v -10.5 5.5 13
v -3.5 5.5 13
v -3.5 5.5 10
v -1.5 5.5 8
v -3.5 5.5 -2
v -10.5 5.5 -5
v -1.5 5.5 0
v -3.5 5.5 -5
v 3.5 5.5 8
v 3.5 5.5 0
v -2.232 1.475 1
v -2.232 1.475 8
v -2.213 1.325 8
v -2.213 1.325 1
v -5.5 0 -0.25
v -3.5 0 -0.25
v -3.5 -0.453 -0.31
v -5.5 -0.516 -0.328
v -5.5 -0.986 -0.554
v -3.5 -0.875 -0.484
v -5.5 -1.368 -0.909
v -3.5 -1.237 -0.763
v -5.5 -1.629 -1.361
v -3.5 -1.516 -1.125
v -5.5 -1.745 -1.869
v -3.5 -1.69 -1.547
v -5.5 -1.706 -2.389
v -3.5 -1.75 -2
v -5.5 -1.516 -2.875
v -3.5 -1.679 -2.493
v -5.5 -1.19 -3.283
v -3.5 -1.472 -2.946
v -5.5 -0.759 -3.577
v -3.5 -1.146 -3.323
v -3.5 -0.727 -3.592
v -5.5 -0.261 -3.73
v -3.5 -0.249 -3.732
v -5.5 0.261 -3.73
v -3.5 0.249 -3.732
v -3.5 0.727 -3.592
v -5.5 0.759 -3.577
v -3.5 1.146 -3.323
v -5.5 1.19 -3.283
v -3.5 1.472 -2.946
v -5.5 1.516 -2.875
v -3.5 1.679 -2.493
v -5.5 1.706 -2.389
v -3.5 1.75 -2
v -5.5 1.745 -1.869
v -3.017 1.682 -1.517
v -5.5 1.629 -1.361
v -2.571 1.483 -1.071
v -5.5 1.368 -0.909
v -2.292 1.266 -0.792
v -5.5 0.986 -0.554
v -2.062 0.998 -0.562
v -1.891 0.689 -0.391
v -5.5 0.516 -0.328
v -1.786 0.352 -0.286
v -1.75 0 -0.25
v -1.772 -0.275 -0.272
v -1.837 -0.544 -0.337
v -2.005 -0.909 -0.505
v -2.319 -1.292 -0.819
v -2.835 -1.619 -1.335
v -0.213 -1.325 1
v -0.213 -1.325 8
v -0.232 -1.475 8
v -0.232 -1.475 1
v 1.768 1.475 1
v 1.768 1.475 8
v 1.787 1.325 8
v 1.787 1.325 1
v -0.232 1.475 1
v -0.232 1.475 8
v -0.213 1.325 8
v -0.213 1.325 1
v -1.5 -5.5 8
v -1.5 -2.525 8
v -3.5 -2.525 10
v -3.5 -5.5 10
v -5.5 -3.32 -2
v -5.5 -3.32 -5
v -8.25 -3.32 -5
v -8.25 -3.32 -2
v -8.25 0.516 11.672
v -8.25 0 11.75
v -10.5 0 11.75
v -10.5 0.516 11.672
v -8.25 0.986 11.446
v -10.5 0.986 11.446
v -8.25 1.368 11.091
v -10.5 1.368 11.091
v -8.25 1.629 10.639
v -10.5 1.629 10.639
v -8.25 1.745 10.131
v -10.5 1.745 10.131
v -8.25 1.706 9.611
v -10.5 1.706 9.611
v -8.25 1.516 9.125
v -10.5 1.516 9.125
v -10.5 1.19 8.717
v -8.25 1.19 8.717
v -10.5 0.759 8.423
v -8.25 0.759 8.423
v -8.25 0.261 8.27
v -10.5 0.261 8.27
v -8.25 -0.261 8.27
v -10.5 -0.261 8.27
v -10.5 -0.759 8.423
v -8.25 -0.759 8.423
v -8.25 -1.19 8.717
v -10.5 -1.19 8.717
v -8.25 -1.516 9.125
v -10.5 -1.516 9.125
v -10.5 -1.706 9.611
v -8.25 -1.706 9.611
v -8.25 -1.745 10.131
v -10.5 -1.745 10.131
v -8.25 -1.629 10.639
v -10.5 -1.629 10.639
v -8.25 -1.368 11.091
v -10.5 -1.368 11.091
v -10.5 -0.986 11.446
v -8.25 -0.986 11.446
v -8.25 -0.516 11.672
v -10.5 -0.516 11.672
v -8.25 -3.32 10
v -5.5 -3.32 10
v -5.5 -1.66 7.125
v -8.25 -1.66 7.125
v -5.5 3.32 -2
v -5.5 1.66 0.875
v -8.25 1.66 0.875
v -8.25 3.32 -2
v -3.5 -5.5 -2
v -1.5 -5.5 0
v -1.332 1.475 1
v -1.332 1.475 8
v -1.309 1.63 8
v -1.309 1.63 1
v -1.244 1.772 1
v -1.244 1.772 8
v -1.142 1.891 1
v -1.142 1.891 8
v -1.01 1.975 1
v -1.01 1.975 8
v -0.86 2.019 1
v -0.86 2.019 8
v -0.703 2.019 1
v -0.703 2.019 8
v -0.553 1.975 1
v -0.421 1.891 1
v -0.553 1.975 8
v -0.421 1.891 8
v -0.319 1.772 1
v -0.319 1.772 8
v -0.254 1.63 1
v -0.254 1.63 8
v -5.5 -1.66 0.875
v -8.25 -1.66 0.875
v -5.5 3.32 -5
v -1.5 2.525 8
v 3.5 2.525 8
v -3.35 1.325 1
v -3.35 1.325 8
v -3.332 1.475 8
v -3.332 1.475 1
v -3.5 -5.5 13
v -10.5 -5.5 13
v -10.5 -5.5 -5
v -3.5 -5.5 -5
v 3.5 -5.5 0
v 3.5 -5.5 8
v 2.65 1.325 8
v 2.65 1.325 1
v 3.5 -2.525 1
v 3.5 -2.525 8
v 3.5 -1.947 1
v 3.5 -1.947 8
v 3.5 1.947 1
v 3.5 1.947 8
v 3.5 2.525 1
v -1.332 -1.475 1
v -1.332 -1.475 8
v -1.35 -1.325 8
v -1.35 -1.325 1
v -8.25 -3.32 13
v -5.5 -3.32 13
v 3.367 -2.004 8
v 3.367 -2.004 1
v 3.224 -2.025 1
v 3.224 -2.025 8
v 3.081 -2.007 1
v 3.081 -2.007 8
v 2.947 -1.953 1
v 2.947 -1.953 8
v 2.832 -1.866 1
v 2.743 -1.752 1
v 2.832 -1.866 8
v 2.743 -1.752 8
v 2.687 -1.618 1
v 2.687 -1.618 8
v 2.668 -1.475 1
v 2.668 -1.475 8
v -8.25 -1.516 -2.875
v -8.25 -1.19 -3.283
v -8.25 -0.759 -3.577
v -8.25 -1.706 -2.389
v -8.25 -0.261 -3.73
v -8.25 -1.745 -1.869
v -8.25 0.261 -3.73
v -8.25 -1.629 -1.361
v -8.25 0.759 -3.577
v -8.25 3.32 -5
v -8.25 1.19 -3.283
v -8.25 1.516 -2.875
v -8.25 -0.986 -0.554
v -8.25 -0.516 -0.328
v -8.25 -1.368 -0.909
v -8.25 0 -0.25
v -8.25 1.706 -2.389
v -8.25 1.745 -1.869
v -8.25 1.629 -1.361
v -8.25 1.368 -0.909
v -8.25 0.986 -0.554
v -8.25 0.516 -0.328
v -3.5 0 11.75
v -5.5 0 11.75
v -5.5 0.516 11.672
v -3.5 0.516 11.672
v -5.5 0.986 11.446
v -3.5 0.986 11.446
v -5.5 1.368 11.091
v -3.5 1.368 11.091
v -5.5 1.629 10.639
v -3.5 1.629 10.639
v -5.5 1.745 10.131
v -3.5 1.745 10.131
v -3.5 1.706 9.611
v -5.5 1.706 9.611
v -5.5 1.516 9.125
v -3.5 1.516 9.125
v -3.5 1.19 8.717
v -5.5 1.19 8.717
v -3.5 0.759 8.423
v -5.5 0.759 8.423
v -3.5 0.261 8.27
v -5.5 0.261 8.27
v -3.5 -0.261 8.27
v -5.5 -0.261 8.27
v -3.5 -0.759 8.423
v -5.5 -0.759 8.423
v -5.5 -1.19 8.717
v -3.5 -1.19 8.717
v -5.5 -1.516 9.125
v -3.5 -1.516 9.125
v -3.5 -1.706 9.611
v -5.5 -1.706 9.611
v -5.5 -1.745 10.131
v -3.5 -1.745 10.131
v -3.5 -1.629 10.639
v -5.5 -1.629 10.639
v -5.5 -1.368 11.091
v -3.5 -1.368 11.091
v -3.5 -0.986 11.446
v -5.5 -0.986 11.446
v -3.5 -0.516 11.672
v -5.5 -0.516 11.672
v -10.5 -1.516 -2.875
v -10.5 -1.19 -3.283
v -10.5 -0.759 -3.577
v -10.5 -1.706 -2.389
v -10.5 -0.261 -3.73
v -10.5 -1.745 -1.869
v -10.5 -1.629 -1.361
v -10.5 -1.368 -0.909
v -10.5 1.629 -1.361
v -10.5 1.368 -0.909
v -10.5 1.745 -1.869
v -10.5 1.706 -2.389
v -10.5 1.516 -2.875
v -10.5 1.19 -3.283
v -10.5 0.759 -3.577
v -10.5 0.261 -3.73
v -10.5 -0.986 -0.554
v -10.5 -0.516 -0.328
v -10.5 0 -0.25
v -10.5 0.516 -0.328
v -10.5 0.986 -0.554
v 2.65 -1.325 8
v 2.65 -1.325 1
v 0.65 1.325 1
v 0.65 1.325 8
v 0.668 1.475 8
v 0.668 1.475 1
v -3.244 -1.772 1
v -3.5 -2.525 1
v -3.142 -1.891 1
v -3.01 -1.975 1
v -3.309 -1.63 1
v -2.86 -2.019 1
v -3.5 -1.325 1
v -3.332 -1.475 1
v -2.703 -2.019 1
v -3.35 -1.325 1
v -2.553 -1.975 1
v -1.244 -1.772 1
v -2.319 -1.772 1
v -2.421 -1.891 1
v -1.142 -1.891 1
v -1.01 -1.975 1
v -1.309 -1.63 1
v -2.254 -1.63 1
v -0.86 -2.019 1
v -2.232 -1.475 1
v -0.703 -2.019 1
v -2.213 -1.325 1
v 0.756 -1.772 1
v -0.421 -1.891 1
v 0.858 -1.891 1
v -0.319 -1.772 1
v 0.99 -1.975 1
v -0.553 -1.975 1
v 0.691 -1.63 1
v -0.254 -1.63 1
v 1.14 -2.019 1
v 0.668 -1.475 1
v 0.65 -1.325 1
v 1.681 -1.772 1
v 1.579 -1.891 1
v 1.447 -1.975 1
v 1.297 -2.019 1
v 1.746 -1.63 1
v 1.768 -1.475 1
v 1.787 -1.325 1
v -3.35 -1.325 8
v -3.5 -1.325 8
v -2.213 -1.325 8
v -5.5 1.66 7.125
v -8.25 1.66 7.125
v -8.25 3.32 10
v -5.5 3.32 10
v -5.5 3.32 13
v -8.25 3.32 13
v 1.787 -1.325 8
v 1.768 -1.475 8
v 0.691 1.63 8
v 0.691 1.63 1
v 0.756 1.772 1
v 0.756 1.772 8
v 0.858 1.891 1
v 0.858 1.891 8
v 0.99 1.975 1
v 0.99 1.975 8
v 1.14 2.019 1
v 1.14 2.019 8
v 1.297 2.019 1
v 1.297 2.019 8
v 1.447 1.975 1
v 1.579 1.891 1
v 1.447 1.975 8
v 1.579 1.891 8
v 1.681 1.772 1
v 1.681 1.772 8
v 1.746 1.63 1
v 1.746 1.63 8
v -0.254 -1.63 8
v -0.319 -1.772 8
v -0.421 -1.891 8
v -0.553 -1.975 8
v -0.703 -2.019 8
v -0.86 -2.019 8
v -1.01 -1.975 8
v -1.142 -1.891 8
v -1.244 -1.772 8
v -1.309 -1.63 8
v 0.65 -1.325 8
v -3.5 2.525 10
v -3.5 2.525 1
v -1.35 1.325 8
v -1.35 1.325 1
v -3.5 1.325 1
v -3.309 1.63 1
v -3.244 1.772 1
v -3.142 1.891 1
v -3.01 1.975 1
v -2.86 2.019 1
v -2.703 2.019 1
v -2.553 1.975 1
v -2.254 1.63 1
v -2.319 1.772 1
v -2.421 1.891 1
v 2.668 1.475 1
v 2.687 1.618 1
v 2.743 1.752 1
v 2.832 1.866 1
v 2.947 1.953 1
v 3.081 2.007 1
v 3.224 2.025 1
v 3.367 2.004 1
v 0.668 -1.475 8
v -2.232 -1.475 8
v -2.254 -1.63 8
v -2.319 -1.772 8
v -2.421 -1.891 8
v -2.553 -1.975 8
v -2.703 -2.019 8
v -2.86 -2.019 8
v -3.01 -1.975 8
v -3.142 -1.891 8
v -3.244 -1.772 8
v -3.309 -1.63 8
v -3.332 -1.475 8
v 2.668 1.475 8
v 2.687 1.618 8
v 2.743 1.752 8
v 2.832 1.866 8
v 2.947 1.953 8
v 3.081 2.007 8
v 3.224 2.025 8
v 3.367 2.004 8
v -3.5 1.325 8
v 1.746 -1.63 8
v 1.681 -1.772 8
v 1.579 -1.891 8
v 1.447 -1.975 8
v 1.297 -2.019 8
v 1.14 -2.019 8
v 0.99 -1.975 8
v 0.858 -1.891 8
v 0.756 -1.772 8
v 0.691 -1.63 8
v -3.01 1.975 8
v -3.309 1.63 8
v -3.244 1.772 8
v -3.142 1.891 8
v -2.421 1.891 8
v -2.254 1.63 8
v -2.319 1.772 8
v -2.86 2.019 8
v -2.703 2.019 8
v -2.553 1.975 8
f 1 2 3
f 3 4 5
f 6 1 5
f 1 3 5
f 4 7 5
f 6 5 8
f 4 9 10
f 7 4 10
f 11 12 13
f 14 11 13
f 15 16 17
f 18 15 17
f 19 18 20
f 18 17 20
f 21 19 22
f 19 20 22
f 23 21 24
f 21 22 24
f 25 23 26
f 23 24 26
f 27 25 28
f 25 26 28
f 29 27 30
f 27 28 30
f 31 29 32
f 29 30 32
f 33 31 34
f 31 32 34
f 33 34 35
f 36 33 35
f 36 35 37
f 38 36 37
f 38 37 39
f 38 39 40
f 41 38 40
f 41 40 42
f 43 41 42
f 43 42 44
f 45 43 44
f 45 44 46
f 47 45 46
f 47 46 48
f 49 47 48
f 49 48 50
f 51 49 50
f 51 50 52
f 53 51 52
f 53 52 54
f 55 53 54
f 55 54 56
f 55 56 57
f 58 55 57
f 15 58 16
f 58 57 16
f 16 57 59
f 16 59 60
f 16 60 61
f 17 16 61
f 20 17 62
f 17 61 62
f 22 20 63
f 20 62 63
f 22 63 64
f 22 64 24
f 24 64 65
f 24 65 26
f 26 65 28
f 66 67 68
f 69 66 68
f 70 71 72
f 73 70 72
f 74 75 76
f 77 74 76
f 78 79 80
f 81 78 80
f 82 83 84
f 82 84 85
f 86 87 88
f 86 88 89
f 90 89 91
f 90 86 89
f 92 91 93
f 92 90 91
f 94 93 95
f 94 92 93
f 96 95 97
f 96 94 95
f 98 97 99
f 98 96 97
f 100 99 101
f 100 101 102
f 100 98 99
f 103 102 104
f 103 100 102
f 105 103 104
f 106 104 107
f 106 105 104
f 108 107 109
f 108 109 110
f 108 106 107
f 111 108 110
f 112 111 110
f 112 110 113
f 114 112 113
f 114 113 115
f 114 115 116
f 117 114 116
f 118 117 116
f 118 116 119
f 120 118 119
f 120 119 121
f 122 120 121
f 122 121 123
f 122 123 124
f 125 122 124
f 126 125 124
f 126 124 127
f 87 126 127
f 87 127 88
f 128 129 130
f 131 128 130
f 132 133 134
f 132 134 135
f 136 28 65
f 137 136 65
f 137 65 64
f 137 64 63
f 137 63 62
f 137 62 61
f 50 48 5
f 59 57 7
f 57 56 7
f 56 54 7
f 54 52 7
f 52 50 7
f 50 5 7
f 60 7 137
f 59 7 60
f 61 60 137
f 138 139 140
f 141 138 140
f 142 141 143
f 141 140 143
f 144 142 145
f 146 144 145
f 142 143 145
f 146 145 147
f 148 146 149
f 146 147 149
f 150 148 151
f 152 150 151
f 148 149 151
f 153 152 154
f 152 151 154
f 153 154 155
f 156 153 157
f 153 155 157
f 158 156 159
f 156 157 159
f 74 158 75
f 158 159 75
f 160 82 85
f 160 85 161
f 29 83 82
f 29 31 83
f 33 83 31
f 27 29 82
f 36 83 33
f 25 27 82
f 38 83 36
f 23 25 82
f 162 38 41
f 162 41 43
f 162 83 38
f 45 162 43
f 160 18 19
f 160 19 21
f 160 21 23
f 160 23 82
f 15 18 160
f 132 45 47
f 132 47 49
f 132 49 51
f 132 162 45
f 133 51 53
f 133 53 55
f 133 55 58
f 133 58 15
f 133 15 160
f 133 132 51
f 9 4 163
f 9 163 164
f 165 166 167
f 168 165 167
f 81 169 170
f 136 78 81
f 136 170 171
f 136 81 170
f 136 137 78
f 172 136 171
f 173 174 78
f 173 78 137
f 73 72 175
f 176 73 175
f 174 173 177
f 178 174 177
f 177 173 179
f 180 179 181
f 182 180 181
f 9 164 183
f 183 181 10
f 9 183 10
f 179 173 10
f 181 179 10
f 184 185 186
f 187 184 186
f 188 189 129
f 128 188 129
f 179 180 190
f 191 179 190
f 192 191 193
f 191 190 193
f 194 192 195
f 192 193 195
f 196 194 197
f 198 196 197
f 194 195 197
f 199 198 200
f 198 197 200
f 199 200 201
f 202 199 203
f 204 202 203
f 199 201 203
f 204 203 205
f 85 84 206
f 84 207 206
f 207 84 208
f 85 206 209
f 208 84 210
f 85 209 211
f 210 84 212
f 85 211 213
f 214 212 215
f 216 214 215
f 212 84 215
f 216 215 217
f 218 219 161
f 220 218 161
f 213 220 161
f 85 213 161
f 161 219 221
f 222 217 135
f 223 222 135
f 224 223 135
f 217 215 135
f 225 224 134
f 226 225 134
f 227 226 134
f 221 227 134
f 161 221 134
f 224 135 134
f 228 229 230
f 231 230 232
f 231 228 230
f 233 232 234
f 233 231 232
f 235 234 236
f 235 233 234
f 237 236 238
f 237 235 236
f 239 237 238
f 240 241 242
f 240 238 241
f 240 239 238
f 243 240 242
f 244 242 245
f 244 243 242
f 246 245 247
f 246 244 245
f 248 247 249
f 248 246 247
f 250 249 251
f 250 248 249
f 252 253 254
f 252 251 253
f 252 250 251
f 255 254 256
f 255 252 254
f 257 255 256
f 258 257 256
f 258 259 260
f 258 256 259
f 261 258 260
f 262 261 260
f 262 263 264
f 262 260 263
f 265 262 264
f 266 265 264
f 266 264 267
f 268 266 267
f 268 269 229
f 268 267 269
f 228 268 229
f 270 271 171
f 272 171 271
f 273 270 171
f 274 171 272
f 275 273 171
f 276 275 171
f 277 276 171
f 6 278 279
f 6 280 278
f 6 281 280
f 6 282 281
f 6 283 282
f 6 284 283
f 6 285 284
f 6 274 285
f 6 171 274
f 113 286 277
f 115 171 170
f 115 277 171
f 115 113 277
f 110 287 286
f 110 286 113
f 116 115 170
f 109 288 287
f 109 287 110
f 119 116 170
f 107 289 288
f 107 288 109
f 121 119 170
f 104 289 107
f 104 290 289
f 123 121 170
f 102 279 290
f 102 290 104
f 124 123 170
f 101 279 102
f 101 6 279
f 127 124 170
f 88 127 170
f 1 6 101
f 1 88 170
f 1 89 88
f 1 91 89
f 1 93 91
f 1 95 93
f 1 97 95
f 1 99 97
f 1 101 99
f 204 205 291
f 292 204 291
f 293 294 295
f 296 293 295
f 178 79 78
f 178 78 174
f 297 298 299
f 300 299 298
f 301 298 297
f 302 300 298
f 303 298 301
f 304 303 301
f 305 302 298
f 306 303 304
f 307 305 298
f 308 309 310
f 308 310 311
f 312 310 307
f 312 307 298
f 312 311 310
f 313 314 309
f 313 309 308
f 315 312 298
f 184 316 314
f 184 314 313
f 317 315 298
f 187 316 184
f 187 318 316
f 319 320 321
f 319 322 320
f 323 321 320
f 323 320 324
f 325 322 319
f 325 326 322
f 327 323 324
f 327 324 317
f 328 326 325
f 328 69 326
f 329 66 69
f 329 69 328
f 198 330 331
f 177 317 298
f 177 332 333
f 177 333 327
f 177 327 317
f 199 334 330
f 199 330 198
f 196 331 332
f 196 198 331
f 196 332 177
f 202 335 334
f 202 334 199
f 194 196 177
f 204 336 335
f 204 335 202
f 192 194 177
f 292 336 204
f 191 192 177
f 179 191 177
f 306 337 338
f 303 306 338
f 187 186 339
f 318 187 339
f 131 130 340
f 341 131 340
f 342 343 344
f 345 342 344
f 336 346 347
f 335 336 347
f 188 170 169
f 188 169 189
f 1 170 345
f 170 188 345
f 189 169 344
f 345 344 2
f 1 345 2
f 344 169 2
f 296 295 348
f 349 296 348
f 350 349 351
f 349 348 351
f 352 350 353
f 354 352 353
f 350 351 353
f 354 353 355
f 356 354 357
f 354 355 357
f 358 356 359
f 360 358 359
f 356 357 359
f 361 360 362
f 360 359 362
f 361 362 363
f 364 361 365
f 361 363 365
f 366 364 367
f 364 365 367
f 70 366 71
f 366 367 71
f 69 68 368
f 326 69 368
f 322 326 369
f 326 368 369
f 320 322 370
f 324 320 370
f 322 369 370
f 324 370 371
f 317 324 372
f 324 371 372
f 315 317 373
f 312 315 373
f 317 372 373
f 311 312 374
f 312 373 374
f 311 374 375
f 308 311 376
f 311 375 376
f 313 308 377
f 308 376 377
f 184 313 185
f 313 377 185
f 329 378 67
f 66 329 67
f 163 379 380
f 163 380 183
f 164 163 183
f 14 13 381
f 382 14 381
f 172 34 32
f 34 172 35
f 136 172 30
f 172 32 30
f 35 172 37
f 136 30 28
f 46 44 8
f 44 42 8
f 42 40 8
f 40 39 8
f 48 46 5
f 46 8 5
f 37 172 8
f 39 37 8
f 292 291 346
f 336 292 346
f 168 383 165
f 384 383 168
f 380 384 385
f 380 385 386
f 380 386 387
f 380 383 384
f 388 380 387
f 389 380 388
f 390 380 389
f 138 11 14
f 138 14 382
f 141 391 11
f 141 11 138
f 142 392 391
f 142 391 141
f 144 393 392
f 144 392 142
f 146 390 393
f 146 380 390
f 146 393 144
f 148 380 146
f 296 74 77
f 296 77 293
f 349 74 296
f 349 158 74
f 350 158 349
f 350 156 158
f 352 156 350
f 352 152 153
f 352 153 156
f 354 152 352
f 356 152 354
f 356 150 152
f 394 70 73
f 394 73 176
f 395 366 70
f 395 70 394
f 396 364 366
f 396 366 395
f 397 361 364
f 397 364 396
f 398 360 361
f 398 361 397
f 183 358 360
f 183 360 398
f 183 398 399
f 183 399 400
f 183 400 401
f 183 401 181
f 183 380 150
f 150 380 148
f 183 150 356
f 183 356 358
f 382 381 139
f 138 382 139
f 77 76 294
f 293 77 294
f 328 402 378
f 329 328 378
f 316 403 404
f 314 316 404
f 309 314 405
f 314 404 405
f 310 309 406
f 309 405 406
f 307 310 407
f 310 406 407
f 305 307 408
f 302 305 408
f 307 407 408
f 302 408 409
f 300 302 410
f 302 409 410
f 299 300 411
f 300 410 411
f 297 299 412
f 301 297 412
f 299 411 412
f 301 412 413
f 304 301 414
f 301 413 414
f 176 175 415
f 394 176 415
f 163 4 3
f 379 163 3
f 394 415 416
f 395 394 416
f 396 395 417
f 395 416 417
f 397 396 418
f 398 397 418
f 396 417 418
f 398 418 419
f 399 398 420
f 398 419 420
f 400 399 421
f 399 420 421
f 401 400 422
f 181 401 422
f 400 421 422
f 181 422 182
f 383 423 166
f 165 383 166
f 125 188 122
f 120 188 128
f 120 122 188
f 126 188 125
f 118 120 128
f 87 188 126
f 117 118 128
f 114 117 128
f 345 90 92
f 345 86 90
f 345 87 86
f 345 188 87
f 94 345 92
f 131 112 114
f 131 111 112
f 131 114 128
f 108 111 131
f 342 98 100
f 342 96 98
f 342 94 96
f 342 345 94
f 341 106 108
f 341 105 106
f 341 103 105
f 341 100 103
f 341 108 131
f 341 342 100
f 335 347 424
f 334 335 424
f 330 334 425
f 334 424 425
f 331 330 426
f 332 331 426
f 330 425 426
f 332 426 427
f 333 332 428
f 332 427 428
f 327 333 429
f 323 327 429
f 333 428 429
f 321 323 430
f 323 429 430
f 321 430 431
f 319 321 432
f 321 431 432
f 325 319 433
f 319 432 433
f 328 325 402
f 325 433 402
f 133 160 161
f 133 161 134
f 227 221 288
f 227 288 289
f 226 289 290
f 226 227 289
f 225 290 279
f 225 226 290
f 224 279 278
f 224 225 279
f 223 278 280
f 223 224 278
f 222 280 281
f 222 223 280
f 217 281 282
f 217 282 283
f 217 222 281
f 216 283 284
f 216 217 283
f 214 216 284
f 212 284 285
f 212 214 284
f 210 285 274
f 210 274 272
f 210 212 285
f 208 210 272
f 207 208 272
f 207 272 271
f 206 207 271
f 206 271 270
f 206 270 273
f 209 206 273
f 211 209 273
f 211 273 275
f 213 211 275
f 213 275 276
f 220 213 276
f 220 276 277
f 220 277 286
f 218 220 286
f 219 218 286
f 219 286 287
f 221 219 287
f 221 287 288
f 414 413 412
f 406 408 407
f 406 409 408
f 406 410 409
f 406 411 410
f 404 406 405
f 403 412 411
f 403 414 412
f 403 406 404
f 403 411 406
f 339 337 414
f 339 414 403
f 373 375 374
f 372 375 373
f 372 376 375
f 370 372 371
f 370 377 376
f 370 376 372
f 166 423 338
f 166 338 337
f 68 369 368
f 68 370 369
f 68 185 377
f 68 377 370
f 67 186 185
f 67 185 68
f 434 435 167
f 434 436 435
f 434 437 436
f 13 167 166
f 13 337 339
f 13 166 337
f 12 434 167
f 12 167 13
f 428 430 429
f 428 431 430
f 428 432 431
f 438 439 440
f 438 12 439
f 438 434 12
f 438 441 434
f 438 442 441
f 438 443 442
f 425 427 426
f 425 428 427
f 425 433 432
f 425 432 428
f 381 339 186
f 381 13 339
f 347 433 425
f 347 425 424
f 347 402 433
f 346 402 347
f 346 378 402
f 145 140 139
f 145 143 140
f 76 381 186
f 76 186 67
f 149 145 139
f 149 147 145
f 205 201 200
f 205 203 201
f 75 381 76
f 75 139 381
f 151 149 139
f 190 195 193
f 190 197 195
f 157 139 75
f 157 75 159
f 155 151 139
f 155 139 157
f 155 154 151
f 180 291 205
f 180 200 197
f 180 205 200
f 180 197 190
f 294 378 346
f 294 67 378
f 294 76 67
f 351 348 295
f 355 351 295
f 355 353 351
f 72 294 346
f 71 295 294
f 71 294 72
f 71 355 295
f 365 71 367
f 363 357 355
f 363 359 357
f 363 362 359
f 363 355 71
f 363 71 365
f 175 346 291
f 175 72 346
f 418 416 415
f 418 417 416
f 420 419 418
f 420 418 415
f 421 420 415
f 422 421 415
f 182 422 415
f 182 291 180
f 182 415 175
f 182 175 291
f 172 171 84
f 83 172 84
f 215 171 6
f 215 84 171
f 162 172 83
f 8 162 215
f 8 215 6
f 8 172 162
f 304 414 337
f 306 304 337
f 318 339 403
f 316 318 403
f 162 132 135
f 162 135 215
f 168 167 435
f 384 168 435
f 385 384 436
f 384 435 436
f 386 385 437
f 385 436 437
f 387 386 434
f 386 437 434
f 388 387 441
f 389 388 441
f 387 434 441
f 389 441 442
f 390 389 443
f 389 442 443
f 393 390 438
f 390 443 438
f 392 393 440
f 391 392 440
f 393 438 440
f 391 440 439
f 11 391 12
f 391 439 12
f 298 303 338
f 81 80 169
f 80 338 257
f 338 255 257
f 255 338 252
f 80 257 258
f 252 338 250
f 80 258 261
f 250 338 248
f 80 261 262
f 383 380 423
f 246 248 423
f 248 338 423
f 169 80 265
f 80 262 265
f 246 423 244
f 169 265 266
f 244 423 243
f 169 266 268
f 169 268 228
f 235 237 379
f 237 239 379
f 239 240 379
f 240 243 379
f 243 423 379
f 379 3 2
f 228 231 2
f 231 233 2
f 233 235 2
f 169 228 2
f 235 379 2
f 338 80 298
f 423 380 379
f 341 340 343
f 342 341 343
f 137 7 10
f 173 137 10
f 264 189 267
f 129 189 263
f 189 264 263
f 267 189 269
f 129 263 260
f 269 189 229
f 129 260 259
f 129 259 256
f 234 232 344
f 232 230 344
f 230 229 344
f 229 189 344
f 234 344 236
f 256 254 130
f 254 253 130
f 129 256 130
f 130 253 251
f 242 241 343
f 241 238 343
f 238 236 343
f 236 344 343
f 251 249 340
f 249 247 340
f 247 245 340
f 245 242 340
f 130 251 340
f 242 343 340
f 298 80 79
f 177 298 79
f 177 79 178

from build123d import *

# Parameters (mm, degrees)
SKETCH_1_W          = 7
SKETCH_1_H          = 11
EXTRUDE_1_DEPTH     = 8
CUT_EXTRUDE_1_DEPTH = 7
SKETCH_3_W          = 18
SKETCH_3_H          = 11
SKETCH_3_R          = 1.75
EXTRUDE_2_DEPTH     = 7
CUT_EXTRUDE_START   = -2
SKETCH_5_W          = 0.875
SKETCH_5_H          = 2.65
SKETCH_5_R          = 1.75
CUT_EXTRUDE_3_DEPTH = 2.75
CHAMFER_1_SIZE      = 2


with BuildPart() as part:
    # Эскиз1 → Бобышка-Вытянуть1 (new body)
    with BuildSketch(Plane.XY):
        Rectangle(SKETCH_1_W, SKETCH_1_H)
    extrude(amount=EXTRUDE_1_DEPTH)

    # Эскиз2 → Вырез-Вытянуть1 (cut)
    with BuildSketch(Plane.XY.offset(8)):
        with BuildLine():
            Line((-3.5, 2.525), (-3.5, 1.325))
            Line((-3.5, 1.325), (-3.35, 1.325))
            Line((-3.35, 1.325), (-3.331582316, 1.475))
            ThreePointArc((-3.331582316, 1.475), (-2.781582316, 2.025), (-2.231582316, 1.475))
            Line((-2.231582316, 1.475), (-2.213164632, 1.325))
            Line((-2.213164632, 1.325), (-1.35, 1.325))
            Line((-1.35, 1.325), (-1.331582316, 1.475))
            ThreePointArc((-1.331582316, 1.475), (-0.781582316, 2.025), (-0.231582316, 1.475))
            Line((-0.231582316, 1.475), (-0.213164632, 1.325))
            Line((-0.213164632, 1.325), (0.65, 1.325))
            Line((0.65, 1.325), (0.668417684, 1.475))
            ThreePointArc((0.668417684, 1.475), (1.218417684, 2.025), (1.768417684, 1.475))
            Line((1.768417684, 1.475), (1.786835368, 1.325))
            Line((1.786835368, 1.325), (2.65, 1.325))
            Line((2.65, 1.325), (2.668417684, 1.475))
            ThreePointArc((2.668417684, 1.475), (2.946728775, 1.953210348), (3.5, 1.947452537))
            Line((3.5, 1.947452537), (3.5, 2.525))
            Line((3.5, 2.525), (-3.5, 2.525))
        make_face()
        with BuildLine():
            Line((-3.35, -1.325), (-3.5, -1.325))
            Line((-3.5, -1.325), (-3.5, -2.525))
            Line((-3.5, -2.525), (3.5, -2.525))
            Line((3.5, -2.525), (3.5, -1.947452537))
            ThreePointArc((3.5, -1.947452537), (2.946728775, -1.953210348), (2.668417684, -1.475))
            Line((2.668417684, -1.475), (2.65, -1.325))
            Line((2.65, -1.325), (1.786835368, -1.325))
            Line((1.786835368, -1.325), (1.768417684, -1.475))
            ThreePointArc((1.768417684, -1.475), (1.218417684, -2.025), (0.668417684, -1.475))
            Line((0.668417684, -1.475), (0.65, -1.325))
            Line((0.65, -1.325), (-0.213164632, -1.325))
            Line((-0.213164632, -1.325), (-0.231582316, -1.475))
            ThreePointArc((-0.231582316, -1.475), (-0.781582316, -2.025), (-1.331582316, -1.475))
            Line((-1.331582316, -1.475), (-1.35, -1.325))
            Line((-1.35, -1.325), (-2.213164632, -1.325))
            Line((-2.213164632, -1.325), (-2.231582316, -1.475))
            ThreePointArc((-2.231582316, -1.475), (-2.781582316, -2.025), (-3.331582316, -1.475))
            Line((-3.331582316, -1.475), (-3.35, -1.325))
        make_face()
    extrude(amount=-CUT_EXTRUDE_1_DEPTH, mode=Mode.SUBTRACT)

    # Эскиз3 → Бобышка-Вытянуть2 (add)
    with BuildSketch(Plane.ZY.offset(3.5)):
        with Locations((4, 0)):
            Rectangle(SKETCH_3_W, SKETCH_3_H)
        with Locations((10, 0)):
            Circle(SKETCH_3_R, mode=Mode.SUBTRACT)
        with Locations((-2, 0)):
            Circle(SKETCH_3_R, mode=Mode.SUBTRACT)
    extrude(amount=EXTRUDE_2_DEPTH)

    # Эскиз5 → Вырез-Вытянуть3 (cut)
    # profile 1 of 5: a face of its own
    with BuildSketch(Plane(origin=(-3.5, 0, 0), x_dir=(0, 0, -1), z_dir=(1, 0, 0)).offset(CUT_EXTRUDE_START)):
        Polygon((2, 3.319764048), (4.875, 1.659882024), (4.875, -1.659882024), (2, -3.319764048), (-0.875, -1.659882024), (-0.875, 1.659882024), align=None)
    # profile 2 of 5: a face of its own
    with BuildSketch(Plane(origin=(-3.5, 0, 0), x_dir=(0, 0, -1), z_dir=(1, 0, 0)).offset(CUT_EXTRUDE_START)):
        Polygon((5, 3.319764048), (5, -3.319764048), (2, -3.319764048), (4.875, -1.659882024), (4.875, 1.659882024), (2, 3.319764048), align=None)
    # profile 3 of 5: a face of its own
    with BuildSketch(Plane(origin=(-3.5, 0, 0), x_dir=(0, 0, -1), z_dir=(1, 0, 0)).offset(CUT_EXTRUDE_START)):
        with Locations((-7.5625, 0)):
            Rectangle(SKETCH_5_W, SKETCH_5_H)
    # profile 4 of 5: a face of its own
    with BuildSketch(Plane(origin=(-3.5, 0, 0), x_dir=(0, 0, -1), z_dir=(1, 0, 0)).offset(CUT_EXTRUDE_START)):
        Polygon((-7.125, 1.659882024), (-10, 3.319764048), (-12.875, 1.659882024), (-12.875, -1.659882024), (-10, -3.319764048), (-7.125, -1.659882024), (-7.125, -1.325), (-8, -1.325), (-8, 1.325), (-7.125, 1.325), align=None)
        with Locations((-10, 0)):
            Circle(SKETCH_5_R, mode=Mode.SUBTRACT)
    # profile 5 of 5: a face of its own
    with BuildSketch(Plane(origin=(-3.5, 0, 0), x_dir=(0, 0, -1), z_dir=(1, 0, 0)).offset(CUT_EXTRUDE_START)):
        Polygon((-12.875, 1.659882024), (-10, 3.319764048), (-13, 3.319764048), (-13, -3.319764048), (-10, -3.319764048), (-12.875, -1.659882024), align=None)
    extrude(amount=-CUT_EXTRUDE_3_DEPTH, mode=Mode.SUBTRACT)

    # Фаска1
    # the kernel refuses this chamfer: 2 mm, written as the material it adds along each edge
    with BuildSketch(Plane(origin=(-3.5, 5.5, 8), x_dir=(1, 0, 0), z_dir=(0, -1, 0)), Plane(origin=(-3.5, -2.525, 8), x_dir=(1, 0, 0), z_dir=(0, -1, 0))) as chamfer_1_piece_1:
        Polygon((CHAMFER_1_SIZE, 0), (0, CHAMFER_1_SIZE), (0, 0), align=None)
    extrude(amount=2.975)
    with BuildSketch(Plane(origin=(-3.5, 10.643365976, 8), x_dir=(1, 0, 0), z_dir=(0, -1, 0))) as chamfer_1_piece_2_section:
        Polygon((CHAMFER_1_SIZE, 0), (0, CHAMFER_1_SIZE), (0, 0), align=None)
    chamfer_1_piece_2 = extrude(amount=13.261731952, mode=Mode.PRIVATE)
    chamfer_1_piece_2 = split(chamfer_1_piece_2, bisect_by=Plane(origin=(-3.5, -2.525, 8), z_dir=(0, -1, 0)), keep=Keep.TOP, mode=Mode.PRIVATE)
    add(chamfer_1_piece_2)
    with BuildSketch(Plane(origin=(-3.5, 2.618365976, 8), x_dir=(1, 0, 0), z_dir=(0, -1, 0))) as chamfer_1_piece_3_section:
        Polygon((CHAMFER_1_SIZE, 0), (0, CHAMFER_1_SIZE), (0, 0), align=None)
    chamfer_1_piece_3 = extrude(amount=13.261731952, mode=Mode.PRIVATE)
    chamfer_1_piece_3 = split(chamfer_1_piece_3, bisect_by=Plane(origin=(-3.5, 2.525, 8), z_dir=(0, 1, 0)), keep=Keep.TOP, mode=Mode.PRIVATE)
    add(chamfer_1_piece_3)
    with BuildSketch(Plane(origin=(-3.5, 5.5, 0), x_dir=(0, 0, -1), z_dir=(0, -1, 0))) as chamfer_1_piece_4_section:
        Polygon((CHAMFER_1_SIZE, 0), (0, CHAMFER_1_SIZE), (0, 0), align=None)
    chamfer_1_piece_4 = extrude(amount=11, mode=Mode.PRIVATE)
    chamfer_1_piece_4 = chamfer_1_piece_4 - Plane(origin=(-3.5, 0, -2), x_dir=(0, 0, 1), z_dir=(1, 0, 0)) * Cylinder(1.75, 30, mode=Mode.PRIVATE)
    add(chamfer_1_piece_4)


solid = part.part
